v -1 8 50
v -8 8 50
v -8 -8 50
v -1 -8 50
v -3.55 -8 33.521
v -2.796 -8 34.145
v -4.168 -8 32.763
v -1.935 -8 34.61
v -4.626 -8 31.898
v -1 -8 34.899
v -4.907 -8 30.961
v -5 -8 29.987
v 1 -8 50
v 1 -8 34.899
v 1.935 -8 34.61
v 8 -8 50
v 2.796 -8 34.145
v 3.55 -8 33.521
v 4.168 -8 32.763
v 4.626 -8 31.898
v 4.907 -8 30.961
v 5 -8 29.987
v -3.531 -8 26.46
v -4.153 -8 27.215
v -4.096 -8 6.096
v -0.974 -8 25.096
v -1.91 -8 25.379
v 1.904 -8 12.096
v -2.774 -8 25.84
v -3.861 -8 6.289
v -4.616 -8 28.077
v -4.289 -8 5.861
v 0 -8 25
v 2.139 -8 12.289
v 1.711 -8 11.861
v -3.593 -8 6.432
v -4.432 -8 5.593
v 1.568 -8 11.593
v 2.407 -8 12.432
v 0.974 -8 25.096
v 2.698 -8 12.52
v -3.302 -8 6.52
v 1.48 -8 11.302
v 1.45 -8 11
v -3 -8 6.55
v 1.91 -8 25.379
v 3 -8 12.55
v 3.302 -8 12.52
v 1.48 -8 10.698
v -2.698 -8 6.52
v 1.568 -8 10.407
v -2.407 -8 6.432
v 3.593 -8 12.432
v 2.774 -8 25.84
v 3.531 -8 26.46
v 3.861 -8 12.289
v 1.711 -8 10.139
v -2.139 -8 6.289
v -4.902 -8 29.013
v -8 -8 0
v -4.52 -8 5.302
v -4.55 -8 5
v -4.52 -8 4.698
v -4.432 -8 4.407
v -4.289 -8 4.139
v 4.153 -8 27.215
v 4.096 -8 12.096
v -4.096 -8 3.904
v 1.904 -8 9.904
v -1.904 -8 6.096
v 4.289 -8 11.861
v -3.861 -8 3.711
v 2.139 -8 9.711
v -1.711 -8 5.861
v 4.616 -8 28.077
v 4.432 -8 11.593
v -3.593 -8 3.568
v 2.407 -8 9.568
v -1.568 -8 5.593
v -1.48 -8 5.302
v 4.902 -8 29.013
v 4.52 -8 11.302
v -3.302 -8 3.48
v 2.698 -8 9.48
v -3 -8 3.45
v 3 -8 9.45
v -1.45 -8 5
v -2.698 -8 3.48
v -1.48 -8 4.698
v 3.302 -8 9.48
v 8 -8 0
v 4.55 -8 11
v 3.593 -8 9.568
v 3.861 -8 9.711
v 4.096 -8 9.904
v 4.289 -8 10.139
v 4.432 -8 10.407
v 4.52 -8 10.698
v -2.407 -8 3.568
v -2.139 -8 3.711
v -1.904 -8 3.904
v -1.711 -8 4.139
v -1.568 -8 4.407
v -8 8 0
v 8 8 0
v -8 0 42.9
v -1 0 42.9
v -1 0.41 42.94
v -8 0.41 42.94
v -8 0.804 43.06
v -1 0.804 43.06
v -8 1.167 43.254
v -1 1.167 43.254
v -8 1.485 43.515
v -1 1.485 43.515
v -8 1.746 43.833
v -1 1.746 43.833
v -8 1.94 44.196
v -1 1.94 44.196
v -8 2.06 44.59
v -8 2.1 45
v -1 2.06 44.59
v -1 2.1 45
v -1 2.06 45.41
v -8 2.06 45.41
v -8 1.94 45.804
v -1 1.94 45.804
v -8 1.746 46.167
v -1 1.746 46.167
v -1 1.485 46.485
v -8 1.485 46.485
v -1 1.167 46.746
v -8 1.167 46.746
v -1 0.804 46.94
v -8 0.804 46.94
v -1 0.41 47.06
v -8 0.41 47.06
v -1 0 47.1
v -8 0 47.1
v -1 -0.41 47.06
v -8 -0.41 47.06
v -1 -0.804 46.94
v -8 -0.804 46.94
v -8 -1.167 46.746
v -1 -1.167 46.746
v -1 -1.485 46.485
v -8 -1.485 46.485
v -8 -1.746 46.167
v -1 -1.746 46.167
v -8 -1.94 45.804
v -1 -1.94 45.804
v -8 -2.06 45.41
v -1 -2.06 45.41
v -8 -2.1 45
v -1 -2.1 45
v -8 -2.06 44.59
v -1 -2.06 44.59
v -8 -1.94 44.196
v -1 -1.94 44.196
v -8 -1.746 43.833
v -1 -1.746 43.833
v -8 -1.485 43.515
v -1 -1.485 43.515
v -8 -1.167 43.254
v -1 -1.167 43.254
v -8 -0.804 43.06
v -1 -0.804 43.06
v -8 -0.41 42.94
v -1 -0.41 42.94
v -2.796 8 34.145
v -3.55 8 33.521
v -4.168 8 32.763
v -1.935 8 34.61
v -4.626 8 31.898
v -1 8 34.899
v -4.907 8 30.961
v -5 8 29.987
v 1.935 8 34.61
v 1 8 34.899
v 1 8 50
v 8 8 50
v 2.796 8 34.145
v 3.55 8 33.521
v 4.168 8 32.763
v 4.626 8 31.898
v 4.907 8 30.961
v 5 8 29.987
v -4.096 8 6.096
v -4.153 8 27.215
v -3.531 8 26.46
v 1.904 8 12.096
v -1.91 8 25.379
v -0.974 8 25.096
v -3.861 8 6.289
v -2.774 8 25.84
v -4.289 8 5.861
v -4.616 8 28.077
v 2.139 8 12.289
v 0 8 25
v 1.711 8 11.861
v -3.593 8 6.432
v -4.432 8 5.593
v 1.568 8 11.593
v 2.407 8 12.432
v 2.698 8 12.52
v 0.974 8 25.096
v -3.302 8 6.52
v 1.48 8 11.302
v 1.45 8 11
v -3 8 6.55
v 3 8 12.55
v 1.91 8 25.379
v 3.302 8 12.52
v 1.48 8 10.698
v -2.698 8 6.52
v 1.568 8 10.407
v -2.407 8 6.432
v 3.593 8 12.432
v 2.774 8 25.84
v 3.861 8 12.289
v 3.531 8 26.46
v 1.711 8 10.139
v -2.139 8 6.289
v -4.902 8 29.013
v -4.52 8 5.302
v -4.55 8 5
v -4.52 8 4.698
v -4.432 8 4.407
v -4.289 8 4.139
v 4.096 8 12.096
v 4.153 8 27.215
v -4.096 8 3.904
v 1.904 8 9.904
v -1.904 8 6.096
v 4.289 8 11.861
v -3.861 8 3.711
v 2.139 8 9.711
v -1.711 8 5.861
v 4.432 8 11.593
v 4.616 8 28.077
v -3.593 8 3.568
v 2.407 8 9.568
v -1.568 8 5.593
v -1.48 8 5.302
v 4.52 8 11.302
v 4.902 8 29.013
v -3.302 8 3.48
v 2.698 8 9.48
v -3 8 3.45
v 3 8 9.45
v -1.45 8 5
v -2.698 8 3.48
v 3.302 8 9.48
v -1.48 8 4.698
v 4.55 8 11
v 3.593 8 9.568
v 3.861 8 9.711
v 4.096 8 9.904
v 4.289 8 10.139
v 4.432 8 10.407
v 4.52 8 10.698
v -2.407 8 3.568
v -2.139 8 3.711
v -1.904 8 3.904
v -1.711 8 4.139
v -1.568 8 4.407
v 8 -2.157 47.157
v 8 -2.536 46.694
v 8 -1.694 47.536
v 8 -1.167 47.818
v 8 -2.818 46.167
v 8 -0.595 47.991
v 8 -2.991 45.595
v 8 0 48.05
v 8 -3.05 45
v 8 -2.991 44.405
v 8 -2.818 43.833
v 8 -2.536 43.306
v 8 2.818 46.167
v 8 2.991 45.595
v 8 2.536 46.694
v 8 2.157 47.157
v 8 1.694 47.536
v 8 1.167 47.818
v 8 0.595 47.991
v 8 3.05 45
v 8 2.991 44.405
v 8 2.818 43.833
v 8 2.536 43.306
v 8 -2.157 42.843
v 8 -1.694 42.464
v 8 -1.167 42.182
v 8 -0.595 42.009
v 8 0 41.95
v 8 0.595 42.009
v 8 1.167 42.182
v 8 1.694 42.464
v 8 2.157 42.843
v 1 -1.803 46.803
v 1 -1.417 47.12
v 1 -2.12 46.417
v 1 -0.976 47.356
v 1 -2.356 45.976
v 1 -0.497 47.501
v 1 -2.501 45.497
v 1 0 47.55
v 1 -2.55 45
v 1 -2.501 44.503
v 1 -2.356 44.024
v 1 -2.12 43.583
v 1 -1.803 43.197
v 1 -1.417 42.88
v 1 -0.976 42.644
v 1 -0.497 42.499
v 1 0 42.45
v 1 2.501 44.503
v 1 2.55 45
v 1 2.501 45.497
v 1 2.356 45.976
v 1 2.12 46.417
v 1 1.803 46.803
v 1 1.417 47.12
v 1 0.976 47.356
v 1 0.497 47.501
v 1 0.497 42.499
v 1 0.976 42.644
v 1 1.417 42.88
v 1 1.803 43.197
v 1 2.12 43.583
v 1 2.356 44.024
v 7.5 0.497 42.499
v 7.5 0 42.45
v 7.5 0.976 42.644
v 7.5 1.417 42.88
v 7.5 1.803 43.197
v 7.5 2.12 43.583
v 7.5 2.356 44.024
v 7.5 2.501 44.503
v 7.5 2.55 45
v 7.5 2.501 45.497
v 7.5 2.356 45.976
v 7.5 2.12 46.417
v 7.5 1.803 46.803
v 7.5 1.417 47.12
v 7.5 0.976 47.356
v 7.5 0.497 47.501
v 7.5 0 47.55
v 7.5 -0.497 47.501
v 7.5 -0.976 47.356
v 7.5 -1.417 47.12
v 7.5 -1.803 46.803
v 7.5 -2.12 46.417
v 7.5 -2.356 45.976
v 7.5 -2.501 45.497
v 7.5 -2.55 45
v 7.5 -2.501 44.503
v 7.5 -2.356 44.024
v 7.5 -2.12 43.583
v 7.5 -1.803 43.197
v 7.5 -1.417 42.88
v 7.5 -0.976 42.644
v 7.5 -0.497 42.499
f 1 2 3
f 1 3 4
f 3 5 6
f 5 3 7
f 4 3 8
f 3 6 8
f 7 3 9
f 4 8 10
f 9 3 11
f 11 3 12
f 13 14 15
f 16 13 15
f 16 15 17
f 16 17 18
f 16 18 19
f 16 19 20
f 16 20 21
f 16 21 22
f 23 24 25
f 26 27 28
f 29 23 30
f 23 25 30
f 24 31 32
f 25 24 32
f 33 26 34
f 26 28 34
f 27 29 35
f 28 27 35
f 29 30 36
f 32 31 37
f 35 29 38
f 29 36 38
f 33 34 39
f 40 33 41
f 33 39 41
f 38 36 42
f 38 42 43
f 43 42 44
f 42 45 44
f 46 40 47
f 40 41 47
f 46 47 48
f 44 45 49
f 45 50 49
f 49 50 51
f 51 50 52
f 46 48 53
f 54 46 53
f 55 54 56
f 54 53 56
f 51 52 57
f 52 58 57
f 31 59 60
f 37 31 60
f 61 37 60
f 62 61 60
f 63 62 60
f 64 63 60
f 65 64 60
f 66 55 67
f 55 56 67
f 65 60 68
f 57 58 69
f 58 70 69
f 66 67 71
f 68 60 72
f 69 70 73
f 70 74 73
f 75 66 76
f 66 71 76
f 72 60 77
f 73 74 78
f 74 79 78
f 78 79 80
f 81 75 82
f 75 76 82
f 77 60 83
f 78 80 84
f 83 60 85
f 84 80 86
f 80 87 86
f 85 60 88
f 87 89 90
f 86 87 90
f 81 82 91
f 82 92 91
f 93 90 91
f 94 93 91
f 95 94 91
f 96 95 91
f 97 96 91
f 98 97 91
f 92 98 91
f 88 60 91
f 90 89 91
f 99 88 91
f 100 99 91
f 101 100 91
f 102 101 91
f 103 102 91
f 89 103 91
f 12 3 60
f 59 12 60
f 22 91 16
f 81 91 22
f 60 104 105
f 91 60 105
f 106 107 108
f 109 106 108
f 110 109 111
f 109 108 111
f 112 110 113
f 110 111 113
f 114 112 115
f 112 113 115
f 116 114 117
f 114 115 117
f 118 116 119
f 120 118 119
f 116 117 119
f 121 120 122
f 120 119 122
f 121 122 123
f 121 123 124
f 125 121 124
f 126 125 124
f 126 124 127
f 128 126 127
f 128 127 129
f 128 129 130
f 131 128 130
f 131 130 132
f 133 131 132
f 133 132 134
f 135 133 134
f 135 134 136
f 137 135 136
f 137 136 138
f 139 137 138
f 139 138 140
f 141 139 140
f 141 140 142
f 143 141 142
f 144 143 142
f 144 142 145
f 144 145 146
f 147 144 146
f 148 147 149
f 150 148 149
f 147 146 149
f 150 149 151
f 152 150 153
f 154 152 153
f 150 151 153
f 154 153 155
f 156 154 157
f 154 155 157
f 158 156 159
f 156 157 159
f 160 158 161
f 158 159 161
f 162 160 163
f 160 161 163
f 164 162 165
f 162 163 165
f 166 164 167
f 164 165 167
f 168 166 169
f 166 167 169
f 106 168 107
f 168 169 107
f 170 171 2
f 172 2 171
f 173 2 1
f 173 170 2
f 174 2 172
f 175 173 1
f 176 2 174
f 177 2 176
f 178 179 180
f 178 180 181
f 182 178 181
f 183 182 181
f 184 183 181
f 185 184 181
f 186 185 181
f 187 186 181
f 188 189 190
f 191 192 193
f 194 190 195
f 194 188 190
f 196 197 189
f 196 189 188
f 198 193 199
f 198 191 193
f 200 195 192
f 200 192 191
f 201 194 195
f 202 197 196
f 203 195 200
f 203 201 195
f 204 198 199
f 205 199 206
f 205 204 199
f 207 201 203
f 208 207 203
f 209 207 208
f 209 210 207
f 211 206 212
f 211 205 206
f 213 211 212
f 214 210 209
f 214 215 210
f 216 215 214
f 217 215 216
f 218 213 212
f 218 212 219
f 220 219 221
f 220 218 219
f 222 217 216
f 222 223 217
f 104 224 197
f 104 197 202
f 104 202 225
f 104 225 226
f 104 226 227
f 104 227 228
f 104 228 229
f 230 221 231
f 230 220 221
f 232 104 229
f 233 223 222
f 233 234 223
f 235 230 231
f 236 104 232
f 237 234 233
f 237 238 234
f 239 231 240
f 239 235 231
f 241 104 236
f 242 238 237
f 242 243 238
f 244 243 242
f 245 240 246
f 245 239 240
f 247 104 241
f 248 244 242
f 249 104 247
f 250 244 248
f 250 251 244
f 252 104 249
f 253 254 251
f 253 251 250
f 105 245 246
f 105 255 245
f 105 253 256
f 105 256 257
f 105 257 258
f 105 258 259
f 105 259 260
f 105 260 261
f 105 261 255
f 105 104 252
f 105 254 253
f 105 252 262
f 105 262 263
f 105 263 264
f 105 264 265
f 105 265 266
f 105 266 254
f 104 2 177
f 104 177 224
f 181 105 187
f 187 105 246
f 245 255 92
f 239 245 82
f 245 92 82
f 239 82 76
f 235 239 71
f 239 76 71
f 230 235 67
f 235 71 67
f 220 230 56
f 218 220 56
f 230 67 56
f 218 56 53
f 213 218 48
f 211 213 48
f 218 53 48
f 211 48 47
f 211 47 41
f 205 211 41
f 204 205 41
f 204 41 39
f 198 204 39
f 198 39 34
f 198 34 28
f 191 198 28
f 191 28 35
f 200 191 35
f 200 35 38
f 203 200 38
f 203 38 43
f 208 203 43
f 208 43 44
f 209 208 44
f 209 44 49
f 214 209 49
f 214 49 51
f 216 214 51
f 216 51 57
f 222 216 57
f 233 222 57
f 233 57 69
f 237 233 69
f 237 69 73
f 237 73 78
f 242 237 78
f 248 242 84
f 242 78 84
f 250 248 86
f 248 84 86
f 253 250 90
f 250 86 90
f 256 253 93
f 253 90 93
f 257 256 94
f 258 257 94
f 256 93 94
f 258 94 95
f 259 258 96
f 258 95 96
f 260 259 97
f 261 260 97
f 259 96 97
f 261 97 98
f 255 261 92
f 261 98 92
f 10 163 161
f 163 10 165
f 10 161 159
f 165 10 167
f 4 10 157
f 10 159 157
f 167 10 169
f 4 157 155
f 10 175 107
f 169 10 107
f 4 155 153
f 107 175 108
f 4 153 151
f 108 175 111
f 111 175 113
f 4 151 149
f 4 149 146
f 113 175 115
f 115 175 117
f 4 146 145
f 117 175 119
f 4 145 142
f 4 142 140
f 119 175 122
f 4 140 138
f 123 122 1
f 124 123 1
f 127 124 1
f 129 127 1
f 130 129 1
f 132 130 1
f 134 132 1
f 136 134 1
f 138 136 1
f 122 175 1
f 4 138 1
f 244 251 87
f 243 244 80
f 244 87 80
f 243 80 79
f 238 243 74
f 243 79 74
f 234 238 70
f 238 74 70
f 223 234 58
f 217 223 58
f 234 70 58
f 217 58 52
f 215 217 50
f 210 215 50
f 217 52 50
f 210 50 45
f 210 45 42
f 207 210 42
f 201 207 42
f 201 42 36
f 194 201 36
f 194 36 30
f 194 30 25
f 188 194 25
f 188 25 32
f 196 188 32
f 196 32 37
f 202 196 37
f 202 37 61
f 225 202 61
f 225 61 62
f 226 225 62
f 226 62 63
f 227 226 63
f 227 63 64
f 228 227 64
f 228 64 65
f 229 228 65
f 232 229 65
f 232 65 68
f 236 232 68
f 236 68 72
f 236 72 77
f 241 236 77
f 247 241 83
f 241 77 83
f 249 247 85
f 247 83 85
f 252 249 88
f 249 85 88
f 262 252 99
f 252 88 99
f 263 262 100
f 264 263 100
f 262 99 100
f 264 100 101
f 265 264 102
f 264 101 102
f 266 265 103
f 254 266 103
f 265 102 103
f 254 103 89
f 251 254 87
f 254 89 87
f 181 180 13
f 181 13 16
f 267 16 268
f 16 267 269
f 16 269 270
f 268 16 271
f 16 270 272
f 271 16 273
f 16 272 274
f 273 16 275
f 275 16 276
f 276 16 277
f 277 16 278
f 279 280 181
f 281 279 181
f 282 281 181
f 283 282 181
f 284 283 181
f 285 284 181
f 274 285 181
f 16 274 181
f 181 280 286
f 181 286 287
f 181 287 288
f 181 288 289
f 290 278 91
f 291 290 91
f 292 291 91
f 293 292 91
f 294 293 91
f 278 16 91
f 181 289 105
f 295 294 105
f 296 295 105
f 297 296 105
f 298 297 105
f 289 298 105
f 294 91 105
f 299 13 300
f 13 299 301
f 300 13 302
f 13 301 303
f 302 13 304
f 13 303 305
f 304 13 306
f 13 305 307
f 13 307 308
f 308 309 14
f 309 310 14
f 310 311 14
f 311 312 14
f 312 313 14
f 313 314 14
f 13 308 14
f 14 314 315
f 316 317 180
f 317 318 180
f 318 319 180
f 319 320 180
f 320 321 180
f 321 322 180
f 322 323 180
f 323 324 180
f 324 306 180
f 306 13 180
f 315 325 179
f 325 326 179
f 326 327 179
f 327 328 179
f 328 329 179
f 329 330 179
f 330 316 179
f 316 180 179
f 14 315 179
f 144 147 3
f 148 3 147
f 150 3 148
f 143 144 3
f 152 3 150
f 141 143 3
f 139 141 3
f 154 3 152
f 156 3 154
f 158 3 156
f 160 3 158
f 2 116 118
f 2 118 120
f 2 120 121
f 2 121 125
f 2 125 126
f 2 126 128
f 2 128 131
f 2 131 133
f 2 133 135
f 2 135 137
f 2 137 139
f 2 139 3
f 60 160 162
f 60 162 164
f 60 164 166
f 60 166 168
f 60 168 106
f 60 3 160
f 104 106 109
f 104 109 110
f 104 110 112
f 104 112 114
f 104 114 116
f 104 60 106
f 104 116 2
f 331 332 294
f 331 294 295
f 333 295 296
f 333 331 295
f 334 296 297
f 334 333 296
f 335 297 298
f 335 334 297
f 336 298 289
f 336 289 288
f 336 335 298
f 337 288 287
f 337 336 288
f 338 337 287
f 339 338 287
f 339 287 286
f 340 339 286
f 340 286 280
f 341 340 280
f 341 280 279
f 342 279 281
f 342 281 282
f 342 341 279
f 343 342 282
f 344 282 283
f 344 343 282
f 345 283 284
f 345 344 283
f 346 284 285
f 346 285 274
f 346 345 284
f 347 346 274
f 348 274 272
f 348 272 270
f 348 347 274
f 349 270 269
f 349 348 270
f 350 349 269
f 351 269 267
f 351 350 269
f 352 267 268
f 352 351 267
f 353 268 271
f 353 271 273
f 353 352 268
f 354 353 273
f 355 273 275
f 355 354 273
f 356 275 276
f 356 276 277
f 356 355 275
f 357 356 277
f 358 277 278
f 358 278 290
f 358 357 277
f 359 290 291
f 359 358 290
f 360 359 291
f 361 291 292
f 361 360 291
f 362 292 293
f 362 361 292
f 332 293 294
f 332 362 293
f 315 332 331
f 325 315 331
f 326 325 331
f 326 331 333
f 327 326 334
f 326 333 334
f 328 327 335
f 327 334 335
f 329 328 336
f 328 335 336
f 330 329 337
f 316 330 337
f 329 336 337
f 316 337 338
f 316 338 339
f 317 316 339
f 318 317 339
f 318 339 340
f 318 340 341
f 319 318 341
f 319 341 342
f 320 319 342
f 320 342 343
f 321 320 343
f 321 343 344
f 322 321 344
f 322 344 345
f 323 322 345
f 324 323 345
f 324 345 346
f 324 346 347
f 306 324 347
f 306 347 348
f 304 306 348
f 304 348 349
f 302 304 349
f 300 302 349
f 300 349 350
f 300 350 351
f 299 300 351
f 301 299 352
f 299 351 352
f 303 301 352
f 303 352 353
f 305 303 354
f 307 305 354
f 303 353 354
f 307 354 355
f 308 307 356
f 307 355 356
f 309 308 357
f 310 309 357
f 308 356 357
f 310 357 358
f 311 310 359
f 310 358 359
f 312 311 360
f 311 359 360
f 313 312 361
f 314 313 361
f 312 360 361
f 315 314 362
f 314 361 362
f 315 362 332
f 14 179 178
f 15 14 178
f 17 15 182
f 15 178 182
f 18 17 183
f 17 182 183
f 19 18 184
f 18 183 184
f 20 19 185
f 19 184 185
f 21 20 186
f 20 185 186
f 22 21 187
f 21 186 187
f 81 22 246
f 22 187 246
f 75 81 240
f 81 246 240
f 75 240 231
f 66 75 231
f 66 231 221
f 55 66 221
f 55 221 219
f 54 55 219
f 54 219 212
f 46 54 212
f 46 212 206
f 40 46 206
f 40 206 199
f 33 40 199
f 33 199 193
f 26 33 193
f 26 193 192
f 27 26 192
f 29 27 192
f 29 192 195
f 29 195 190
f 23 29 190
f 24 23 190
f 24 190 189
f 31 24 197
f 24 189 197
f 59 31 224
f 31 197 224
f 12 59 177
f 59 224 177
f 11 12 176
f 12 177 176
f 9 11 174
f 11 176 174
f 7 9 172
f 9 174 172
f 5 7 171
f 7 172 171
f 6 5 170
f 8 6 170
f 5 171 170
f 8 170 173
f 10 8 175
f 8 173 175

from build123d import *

# Parameters (mm, degrees)
SKETCH1_W                              = 16
SKETCH1_H                              = 16
BASE_DEPTH                             = 50
SKETCH2_R                              = 5
RODSLOT_DEPTH                          = 54.103672189
RODSLOTSCREW_REACH                     = 55.104
SKETCH3_R                              = 2.55
CHAMFER1_SIZE                          = 0.5
M5X0_8_TAPPED_HOLE_FOR_ROD_SCREW_D     = 4.2
M5X0_8_TAPPED_HOLE_FOR_ROD_SCREW_DEPTH = 7.6381927
M5X0_8_TAPPED_HOLE_FOR_ROD_SCREW_TIP   = 1.2618073
SKETCH6_R                              = 1.55
SCREWSHOLES_DEPTH                      = 54.103672189


with BuildPart() as part:
    # Sketch1 → Base (new body)
    with BuildSketch(Plane.XY):
        Rectangle(SKETCH1_W, SKETCH1_H)
    extrude(amount=BASE_DEPTH)

    # Sketch2 → RodSlot (cut, through all)
    with BuildSketch(Plane(origin=(0, 8, 0), x_dir=(1, 0, 0), z_dir=(0, 1, 0))):
        with Locations((0, -30)):
            Circle(SKETCH2_R)
        with BuildLine():
            Line((-1, -34.898979486), (-1, -50))
            Line((-1, -50), (1, -50))
            Line((1, -50), (1, -34.898979486))
            ThreePointArc((1, -34.898979486), (0, -35), (-1, -34.898979486))
        make_face()
    extrude(amount=-RODSLOT_DEPTH, mode=Mode.SUBTRACT)

    # Sketch3 → RodSlotScrew (cut, up to next)
    with BuildSketch(Plane(origin=(8, 0, 0), x_dir=(0, 0, -1), z_dir=(1, 0, 0)), mode=Mode.PRIVATE) as rodslotscrew_sk1:
        with Locations((-45, 0)):
            Circle(SKETCH3_R)
    rodslotscrew_tool1 = extrude(rodslotscrew_sk1.sketch, amount=-RODSLOTSCREW_REACH, mode=Mode.PRIVATE) & part.part
    add(rodslotscrew_tool1.solids().sort_by_distance((8, 0, 45))[0], mode=Mode.SUBTRACT)

    # Chamfer1
    chamfer1_edges = [part.edges().sort_by_distance(p)[0] for p in [
        (8, 0, 47.55),
    ]]
    chamfer(chamfer1_edges, length=CHAMFER1_SIZE)

    # M5x0.8 Tapped Hole for rod screw
    with Locations(Plane.ZY.offset(8)):
        with Locations((45, 0)):
            Hole(M5X0_8_TAPPED_HOLE_FOR_ROD_SCREW_D / 2, depth=M5X0_8_TAPPED_HOLE_FOR_ROD_SCREW_DEPTH)
            with Locations((0, 0, -(M5X0_8_TAPPED_HOLE_FOR_ROD_SCREW_DEPTH + M5X0_8_TAPPED_HOLE_FOR_ROD_SCREW_TIP / 2))):  # 118° drill point
                Cone(0, M5X0_8_TAPPED_HOLE_FOR_ROD_SCREW_D / 2, M5X0_8_TAPPED_HOLE_FOR_ROD_SCREW_TIP, mode=Mode.SUBTRACT)

    # Sketch6 → ScrewsHoles (cut, through all)
    with BuildSketch(Plane.XZ.offset(8)):
        with Locations((3, 11)):
            Circle(SKETCH6_R)
        with Locations((-3, 5)):
            Circle(SKETCH6_R)
    extrude(amount=-SCREWSHOLES_DEPTH, mode=Mode.SUBTRACT)


solid = part.part
